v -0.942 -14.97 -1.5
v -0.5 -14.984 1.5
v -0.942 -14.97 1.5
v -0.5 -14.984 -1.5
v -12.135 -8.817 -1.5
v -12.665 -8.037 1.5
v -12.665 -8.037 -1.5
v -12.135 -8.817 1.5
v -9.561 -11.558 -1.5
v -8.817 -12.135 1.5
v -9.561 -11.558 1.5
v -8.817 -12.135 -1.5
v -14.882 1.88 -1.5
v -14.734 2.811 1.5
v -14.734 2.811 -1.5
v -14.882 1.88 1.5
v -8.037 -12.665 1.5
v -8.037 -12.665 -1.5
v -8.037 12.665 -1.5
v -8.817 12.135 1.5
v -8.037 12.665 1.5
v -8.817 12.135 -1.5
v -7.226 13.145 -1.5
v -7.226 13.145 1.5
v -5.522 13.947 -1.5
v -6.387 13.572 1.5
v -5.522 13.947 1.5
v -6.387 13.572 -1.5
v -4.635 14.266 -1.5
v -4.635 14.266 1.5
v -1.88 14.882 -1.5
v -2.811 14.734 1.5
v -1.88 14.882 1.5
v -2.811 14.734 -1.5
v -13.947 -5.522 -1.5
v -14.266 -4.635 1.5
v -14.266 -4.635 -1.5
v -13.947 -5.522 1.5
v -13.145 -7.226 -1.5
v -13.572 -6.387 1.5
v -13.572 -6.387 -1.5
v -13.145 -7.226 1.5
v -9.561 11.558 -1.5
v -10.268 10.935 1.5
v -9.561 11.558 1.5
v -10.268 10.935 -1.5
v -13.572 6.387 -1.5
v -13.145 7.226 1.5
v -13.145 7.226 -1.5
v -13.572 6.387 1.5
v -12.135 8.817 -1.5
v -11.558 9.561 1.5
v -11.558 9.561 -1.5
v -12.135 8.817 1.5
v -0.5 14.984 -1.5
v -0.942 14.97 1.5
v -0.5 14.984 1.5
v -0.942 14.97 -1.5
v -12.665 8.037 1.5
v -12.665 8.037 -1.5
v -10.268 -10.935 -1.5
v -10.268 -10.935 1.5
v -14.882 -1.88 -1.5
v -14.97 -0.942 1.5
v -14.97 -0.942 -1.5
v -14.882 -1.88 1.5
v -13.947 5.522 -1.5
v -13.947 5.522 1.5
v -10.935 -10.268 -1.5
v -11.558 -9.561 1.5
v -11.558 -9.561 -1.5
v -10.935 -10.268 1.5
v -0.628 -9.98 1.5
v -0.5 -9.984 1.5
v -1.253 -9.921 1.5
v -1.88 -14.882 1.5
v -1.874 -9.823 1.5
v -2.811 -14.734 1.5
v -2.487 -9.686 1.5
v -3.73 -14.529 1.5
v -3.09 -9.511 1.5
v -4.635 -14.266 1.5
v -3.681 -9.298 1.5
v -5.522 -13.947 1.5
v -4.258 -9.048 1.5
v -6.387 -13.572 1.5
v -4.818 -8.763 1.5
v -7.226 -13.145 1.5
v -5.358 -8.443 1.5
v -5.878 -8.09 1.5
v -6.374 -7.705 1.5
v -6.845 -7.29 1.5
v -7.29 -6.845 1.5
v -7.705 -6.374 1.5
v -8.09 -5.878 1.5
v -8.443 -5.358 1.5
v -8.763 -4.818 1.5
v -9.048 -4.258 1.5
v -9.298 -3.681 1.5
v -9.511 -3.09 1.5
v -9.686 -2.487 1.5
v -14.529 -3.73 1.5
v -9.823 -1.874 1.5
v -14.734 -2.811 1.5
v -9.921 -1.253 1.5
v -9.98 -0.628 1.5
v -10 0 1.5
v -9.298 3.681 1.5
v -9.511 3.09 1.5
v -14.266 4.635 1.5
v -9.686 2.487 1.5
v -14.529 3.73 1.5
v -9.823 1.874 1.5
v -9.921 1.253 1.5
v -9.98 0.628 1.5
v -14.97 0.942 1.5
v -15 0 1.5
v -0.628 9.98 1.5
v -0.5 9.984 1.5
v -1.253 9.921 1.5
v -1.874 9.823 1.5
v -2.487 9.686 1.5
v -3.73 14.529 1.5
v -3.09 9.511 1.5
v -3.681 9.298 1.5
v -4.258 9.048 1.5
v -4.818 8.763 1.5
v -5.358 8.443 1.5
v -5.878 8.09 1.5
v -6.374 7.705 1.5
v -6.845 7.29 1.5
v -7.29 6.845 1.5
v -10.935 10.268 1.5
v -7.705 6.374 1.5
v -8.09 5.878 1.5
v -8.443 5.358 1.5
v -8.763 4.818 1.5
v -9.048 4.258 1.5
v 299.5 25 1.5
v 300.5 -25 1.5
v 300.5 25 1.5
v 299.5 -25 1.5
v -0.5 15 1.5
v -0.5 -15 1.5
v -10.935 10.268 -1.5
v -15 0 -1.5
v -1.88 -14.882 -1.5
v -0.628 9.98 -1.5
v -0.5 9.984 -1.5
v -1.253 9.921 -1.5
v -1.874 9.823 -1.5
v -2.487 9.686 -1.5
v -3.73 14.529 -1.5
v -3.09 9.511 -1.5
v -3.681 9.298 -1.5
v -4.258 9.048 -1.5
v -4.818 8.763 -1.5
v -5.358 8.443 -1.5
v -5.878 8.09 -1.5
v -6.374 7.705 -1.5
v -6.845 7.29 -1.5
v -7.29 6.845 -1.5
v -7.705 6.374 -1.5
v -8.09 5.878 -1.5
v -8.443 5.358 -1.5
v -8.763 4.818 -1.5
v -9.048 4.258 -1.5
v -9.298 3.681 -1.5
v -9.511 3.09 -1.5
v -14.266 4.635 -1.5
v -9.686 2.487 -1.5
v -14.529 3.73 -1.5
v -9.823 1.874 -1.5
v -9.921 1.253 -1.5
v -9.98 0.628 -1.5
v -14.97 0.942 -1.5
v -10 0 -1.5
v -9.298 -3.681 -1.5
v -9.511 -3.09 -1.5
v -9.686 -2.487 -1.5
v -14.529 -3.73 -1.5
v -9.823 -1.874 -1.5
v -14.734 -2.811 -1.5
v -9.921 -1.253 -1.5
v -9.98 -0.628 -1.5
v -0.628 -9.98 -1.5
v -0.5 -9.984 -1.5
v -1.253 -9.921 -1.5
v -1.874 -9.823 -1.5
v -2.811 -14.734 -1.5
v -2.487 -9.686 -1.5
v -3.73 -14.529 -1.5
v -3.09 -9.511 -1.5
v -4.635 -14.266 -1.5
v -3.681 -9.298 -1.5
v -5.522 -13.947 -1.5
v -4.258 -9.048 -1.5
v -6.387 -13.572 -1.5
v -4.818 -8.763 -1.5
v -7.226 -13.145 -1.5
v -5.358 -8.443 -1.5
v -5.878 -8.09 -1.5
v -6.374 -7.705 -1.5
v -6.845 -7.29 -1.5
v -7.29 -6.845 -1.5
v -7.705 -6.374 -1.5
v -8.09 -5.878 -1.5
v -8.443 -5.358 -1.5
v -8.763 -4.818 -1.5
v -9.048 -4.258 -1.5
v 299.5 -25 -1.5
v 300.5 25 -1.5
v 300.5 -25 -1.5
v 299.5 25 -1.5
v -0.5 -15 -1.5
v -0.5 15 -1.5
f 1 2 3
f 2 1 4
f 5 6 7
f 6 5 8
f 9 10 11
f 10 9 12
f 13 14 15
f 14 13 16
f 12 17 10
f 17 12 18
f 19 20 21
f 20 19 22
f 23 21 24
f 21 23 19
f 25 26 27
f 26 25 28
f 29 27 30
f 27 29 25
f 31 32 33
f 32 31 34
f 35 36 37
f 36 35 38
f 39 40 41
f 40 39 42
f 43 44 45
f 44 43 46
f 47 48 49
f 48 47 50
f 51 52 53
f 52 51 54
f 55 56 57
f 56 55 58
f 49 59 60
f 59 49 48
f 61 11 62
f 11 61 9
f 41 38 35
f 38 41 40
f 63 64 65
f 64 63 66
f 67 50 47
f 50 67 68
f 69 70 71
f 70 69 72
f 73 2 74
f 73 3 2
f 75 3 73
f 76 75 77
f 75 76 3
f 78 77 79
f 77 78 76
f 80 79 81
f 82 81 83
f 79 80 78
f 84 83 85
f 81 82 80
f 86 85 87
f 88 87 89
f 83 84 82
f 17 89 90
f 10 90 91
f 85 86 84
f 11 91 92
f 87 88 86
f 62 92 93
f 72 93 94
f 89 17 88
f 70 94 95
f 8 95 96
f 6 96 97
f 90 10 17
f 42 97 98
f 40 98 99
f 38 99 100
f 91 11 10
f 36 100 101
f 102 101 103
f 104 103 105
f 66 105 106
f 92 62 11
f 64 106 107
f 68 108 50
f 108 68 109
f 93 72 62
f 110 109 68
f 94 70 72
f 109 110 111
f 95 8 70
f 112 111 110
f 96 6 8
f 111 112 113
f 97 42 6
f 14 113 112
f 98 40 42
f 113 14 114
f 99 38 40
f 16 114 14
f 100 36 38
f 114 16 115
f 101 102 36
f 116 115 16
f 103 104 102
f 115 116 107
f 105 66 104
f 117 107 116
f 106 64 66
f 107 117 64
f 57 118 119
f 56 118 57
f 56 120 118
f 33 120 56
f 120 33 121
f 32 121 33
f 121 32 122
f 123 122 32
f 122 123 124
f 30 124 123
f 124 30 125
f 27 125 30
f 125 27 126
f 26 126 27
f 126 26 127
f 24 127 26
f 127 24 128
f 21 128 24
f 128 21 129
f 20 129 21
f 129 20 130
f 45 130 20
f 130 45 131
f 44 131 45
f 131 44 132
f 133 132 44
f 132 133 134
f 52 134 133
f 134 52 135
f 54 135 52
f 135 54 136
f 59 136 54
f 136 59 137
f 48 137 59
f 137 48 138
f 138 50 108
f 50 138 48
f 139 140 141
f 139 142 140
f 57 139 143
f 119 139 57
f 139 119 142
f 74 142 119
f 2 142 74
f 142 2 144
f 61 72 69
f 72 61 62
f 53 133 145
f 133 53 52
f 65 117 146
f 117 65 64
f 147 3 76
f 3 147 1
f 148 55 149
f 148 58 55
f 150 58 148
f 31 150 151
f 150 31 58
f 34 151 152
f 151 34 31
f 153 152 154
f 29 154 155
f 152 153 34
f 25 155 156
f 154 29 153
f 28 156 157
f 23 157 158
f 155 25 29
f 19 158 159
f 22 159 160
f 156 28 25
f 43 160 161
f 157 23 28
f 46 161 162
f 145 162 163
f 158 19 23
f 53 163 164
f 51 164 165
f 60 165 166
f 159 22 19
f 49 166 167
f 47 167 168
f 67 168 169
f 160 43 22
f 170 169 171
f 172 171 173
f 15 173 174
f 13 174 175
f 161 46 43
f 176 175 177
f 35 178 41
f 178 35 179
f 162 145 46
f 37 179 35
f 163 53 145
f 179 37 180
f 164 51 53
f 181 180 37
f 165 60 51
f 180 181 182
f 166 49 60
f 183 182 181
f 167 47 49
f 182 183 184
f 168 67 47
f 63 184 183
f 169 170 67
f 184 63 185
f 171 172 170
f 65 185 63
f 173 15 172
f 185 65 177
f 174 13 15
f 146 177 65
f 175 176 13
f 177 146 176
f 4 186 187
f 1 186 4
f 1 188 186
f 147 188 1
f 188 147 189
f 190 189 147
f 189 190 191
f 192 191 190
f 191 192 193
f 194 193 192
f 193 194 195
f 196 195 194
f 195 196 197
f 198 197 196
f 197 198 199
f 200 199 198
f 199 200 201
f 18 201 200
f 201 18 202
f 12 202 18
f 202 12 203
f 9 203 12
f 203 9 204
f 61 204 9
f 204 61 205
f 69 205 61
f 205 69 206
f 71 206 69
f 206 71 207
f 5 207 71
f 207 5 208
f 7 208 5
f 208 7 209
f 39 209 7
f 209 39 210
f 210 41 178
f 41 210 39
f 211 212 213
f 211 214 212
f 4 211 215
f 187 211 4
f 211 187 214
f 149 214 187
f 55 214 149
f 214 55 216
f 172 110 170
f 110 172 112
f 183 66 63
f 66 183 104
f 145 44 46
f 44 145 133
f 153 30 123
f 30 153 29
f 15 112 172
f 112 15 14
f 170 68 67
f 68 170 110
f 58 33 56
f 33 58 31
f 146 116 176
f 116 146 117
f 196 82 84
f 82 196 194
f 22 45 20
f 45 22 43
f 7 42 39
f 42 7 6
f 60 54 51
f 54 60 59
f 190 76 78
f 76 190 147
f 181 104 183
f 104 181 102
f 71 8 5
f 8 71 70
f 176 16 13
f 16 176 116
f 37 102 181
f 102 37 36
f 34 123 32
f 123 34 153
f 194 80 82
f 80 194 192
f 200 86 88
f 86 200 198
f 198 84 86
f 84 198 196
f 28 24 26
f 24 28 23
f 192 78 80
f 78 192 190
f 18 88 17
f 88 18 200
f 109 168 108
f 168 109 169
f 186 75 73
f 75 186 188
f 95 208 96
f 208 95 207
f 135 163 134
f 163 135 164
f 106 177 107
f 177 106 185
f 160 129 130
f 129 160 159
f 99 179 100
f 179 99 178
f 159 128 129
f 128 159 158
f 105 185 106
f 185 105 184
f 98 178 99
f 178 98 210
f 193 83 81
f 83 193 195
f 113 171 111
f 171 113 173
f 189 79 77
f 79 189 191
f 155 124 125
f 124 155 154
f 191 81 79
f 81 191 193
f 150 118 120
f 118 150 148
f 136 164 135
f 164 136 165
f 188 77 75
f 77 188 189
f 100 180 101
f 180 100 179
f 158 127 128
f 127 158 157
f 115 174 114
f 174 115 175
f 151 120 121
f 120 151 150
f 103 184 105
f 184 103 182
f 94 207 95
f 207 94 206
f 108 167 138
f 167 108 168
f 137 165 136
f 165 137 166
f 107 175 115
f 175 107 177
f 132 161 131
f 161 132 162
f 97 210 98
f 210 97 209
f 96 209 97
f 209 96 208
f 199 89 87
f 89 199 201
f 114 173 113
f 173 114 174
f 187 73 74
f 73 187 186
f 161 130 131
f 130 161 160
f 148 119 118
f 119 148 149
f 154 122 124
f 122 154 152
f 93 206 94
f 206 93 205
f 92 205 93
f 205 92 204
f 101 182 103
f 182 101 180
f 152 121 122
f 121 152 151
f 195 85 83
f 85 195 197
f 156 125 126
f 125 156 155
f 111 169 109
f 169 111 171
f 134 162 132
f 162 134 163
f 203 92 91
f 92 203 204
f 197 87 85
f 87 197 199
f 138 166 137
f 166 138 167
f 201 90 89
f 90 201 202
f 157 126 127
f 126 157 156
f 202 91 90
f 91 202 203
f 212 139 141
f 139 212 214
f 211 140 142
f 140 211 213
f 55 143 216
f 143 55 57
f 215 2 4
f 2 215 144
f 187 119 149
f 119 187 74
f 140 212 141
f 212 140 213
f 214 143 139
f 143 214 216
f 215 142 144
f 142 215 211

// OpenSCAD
fn=100;
difference() {
    cylinder(d=30, h=3, center=true, $fn=fn);
    cylinder(d=20, h=5, center=true, $fn=fn);
}

hull() {
    cube([1,30,3], center=true);    
    translate([300,0,0]) cube([1,50,3], center=true);
}
